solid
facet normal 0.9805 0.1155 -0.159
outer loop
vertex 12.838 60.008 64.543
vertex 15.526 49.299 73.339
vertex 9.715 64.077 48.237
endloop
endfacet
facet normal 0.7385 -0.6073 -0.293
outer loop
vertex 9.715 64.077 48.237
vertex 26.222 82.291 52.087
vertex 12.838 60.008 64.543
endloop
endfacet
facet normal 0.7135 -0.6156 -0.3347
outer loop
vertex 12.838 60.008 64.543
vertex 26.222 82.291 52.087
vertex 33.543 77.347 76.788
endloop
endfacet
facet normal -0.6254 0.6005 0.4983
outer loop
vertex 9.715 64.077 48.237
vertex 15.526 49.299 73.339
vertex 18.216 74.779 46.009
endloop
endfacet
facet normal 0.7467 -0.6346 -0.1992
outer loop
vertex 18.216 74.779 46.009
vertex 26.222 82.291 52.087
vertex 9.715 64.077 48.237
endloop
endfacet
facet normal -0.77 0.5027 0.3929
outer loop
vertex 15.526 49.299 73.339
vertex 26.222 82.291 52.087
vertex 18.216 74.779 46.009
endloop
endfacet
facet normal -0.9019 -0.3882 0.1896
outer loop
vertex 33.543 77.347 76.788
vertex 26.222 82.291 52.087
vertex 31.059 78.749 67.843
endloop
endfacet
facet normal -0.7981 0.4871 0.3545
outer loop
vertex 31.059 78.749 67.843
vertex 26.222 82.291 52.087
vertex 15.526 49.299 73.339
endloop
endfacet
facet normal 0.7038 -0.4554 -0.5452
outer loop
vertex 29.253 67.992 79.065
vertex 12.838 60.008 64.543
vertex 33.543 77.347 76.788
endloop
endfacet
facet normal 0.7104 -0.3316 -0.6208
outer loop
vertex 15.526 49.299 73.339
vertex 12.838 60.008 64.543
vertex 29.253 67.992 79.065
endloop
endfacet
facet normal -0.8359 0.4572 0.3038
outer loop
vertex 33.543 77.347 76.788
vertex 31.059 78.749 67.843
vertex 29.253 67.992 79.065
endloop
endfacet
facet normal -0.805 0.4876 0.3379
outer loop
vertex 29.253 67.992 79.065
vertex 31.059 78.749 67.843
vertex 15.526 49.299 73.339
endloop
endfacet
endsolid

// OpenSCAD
// Auto-generated auxetic polyhedron
points = [
    [9.715274, 64.076828, 48.236771],
    [15.526195, 49.298849, 73.338822],
    [12.838162, 60.008106, 64.543070],
    [26.222180, 82.291267, 52.087112],
    [33.542513, 77.347475, 76.788154],
    [18.215867, 74.779024, 46.009368],
    [31.058725, 78.749044, 67.842683],
    [29.253242, 67.991984, 79.064535],
];

faces = [
    [0, 1, 2],
    [2, 3, 0],
    [4, 3, 2],
    [5, 1, 0],
    [0, 3, 5],
    [5, 3, 1],
    [6, 3, 4],
    [1, 3, 6],
    [4, 2, 7],
    [7, 2, 1],
    [7, 6, 4],
    [1, 6, 7],
];

polyhedron(points = points, faces = faces);
